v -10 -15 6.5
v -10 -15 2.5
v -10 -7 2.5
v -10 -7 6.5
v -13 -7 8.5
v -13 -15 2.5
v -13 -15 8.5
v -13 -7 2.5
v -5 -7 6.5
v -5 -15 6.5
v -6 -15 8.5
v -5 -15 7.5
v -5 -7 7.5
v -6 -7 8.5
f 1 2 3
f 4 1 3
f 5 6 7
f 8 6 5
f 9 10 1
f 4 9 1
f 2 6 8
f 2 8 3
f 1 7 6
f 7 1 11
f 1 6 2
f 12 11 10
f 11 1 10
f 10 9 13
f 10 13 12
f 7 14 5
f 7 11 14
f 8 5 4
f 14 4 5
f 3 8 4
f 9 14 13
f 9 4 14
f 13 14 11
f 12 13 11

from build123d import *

# Parameters (mm, degrees)
BOX036_W                = 3
BOX036_H                = 8
BOX036_DEPTH            = 4
BOX035_W                = 8
BOX035_H                = 8
BOX035_DEPTH            = 2
CHAMFER_SIZE            = 1
CHAMFER_PLACEMENT_ANGLE = 180


with BuildPart() as cubo036:
    # Box036 → Box036 (new body)
    with BuildSketch(Plane(origin=(-13, -15, 2.5), x_dir=(1, 0, 0), z_dir=(0, 0, 1))):
        with Locations((1.5, 4)):
            Rectangle(BOX036_W, BOX036_H)
    extrude(amount=BOX036_DEPTH)


with BuildPart() as fusion002021:
    # Box035 → Box035 (new body)
    with BuildSketch(Plane(origin=(-13, -15, 6), x_dir=(1, 0, 0), z_dir=(0, 0, 1))):
        with Locations((4, 4)):
            Rectangle(BOX035_W, BOX035_H)
    extrude(amount=BOX035_DEPTH)

    # Chamfer
    chamfer_edges = [fusion002021.edges().sort_by_distance(p)[0] for p in [
        (-13, -11, 8),
    ]]
    chamfer(chamfer_edges, length=CHAMFER_SIZE)


with BuildPart() as fusion002021_1:
    # Chamfer placement: moved
    add(fusion002021.part.moved(Location((-18, -22, 0.5))).rotate(Axis((-18, -22, 0.5), (0, 0, 1)), CHAMFER_PLACEMENT_ANGLE))

    # Fusion002021: union Cubo036
    add(cubo036.part)


solid = fusion002021_1.part
